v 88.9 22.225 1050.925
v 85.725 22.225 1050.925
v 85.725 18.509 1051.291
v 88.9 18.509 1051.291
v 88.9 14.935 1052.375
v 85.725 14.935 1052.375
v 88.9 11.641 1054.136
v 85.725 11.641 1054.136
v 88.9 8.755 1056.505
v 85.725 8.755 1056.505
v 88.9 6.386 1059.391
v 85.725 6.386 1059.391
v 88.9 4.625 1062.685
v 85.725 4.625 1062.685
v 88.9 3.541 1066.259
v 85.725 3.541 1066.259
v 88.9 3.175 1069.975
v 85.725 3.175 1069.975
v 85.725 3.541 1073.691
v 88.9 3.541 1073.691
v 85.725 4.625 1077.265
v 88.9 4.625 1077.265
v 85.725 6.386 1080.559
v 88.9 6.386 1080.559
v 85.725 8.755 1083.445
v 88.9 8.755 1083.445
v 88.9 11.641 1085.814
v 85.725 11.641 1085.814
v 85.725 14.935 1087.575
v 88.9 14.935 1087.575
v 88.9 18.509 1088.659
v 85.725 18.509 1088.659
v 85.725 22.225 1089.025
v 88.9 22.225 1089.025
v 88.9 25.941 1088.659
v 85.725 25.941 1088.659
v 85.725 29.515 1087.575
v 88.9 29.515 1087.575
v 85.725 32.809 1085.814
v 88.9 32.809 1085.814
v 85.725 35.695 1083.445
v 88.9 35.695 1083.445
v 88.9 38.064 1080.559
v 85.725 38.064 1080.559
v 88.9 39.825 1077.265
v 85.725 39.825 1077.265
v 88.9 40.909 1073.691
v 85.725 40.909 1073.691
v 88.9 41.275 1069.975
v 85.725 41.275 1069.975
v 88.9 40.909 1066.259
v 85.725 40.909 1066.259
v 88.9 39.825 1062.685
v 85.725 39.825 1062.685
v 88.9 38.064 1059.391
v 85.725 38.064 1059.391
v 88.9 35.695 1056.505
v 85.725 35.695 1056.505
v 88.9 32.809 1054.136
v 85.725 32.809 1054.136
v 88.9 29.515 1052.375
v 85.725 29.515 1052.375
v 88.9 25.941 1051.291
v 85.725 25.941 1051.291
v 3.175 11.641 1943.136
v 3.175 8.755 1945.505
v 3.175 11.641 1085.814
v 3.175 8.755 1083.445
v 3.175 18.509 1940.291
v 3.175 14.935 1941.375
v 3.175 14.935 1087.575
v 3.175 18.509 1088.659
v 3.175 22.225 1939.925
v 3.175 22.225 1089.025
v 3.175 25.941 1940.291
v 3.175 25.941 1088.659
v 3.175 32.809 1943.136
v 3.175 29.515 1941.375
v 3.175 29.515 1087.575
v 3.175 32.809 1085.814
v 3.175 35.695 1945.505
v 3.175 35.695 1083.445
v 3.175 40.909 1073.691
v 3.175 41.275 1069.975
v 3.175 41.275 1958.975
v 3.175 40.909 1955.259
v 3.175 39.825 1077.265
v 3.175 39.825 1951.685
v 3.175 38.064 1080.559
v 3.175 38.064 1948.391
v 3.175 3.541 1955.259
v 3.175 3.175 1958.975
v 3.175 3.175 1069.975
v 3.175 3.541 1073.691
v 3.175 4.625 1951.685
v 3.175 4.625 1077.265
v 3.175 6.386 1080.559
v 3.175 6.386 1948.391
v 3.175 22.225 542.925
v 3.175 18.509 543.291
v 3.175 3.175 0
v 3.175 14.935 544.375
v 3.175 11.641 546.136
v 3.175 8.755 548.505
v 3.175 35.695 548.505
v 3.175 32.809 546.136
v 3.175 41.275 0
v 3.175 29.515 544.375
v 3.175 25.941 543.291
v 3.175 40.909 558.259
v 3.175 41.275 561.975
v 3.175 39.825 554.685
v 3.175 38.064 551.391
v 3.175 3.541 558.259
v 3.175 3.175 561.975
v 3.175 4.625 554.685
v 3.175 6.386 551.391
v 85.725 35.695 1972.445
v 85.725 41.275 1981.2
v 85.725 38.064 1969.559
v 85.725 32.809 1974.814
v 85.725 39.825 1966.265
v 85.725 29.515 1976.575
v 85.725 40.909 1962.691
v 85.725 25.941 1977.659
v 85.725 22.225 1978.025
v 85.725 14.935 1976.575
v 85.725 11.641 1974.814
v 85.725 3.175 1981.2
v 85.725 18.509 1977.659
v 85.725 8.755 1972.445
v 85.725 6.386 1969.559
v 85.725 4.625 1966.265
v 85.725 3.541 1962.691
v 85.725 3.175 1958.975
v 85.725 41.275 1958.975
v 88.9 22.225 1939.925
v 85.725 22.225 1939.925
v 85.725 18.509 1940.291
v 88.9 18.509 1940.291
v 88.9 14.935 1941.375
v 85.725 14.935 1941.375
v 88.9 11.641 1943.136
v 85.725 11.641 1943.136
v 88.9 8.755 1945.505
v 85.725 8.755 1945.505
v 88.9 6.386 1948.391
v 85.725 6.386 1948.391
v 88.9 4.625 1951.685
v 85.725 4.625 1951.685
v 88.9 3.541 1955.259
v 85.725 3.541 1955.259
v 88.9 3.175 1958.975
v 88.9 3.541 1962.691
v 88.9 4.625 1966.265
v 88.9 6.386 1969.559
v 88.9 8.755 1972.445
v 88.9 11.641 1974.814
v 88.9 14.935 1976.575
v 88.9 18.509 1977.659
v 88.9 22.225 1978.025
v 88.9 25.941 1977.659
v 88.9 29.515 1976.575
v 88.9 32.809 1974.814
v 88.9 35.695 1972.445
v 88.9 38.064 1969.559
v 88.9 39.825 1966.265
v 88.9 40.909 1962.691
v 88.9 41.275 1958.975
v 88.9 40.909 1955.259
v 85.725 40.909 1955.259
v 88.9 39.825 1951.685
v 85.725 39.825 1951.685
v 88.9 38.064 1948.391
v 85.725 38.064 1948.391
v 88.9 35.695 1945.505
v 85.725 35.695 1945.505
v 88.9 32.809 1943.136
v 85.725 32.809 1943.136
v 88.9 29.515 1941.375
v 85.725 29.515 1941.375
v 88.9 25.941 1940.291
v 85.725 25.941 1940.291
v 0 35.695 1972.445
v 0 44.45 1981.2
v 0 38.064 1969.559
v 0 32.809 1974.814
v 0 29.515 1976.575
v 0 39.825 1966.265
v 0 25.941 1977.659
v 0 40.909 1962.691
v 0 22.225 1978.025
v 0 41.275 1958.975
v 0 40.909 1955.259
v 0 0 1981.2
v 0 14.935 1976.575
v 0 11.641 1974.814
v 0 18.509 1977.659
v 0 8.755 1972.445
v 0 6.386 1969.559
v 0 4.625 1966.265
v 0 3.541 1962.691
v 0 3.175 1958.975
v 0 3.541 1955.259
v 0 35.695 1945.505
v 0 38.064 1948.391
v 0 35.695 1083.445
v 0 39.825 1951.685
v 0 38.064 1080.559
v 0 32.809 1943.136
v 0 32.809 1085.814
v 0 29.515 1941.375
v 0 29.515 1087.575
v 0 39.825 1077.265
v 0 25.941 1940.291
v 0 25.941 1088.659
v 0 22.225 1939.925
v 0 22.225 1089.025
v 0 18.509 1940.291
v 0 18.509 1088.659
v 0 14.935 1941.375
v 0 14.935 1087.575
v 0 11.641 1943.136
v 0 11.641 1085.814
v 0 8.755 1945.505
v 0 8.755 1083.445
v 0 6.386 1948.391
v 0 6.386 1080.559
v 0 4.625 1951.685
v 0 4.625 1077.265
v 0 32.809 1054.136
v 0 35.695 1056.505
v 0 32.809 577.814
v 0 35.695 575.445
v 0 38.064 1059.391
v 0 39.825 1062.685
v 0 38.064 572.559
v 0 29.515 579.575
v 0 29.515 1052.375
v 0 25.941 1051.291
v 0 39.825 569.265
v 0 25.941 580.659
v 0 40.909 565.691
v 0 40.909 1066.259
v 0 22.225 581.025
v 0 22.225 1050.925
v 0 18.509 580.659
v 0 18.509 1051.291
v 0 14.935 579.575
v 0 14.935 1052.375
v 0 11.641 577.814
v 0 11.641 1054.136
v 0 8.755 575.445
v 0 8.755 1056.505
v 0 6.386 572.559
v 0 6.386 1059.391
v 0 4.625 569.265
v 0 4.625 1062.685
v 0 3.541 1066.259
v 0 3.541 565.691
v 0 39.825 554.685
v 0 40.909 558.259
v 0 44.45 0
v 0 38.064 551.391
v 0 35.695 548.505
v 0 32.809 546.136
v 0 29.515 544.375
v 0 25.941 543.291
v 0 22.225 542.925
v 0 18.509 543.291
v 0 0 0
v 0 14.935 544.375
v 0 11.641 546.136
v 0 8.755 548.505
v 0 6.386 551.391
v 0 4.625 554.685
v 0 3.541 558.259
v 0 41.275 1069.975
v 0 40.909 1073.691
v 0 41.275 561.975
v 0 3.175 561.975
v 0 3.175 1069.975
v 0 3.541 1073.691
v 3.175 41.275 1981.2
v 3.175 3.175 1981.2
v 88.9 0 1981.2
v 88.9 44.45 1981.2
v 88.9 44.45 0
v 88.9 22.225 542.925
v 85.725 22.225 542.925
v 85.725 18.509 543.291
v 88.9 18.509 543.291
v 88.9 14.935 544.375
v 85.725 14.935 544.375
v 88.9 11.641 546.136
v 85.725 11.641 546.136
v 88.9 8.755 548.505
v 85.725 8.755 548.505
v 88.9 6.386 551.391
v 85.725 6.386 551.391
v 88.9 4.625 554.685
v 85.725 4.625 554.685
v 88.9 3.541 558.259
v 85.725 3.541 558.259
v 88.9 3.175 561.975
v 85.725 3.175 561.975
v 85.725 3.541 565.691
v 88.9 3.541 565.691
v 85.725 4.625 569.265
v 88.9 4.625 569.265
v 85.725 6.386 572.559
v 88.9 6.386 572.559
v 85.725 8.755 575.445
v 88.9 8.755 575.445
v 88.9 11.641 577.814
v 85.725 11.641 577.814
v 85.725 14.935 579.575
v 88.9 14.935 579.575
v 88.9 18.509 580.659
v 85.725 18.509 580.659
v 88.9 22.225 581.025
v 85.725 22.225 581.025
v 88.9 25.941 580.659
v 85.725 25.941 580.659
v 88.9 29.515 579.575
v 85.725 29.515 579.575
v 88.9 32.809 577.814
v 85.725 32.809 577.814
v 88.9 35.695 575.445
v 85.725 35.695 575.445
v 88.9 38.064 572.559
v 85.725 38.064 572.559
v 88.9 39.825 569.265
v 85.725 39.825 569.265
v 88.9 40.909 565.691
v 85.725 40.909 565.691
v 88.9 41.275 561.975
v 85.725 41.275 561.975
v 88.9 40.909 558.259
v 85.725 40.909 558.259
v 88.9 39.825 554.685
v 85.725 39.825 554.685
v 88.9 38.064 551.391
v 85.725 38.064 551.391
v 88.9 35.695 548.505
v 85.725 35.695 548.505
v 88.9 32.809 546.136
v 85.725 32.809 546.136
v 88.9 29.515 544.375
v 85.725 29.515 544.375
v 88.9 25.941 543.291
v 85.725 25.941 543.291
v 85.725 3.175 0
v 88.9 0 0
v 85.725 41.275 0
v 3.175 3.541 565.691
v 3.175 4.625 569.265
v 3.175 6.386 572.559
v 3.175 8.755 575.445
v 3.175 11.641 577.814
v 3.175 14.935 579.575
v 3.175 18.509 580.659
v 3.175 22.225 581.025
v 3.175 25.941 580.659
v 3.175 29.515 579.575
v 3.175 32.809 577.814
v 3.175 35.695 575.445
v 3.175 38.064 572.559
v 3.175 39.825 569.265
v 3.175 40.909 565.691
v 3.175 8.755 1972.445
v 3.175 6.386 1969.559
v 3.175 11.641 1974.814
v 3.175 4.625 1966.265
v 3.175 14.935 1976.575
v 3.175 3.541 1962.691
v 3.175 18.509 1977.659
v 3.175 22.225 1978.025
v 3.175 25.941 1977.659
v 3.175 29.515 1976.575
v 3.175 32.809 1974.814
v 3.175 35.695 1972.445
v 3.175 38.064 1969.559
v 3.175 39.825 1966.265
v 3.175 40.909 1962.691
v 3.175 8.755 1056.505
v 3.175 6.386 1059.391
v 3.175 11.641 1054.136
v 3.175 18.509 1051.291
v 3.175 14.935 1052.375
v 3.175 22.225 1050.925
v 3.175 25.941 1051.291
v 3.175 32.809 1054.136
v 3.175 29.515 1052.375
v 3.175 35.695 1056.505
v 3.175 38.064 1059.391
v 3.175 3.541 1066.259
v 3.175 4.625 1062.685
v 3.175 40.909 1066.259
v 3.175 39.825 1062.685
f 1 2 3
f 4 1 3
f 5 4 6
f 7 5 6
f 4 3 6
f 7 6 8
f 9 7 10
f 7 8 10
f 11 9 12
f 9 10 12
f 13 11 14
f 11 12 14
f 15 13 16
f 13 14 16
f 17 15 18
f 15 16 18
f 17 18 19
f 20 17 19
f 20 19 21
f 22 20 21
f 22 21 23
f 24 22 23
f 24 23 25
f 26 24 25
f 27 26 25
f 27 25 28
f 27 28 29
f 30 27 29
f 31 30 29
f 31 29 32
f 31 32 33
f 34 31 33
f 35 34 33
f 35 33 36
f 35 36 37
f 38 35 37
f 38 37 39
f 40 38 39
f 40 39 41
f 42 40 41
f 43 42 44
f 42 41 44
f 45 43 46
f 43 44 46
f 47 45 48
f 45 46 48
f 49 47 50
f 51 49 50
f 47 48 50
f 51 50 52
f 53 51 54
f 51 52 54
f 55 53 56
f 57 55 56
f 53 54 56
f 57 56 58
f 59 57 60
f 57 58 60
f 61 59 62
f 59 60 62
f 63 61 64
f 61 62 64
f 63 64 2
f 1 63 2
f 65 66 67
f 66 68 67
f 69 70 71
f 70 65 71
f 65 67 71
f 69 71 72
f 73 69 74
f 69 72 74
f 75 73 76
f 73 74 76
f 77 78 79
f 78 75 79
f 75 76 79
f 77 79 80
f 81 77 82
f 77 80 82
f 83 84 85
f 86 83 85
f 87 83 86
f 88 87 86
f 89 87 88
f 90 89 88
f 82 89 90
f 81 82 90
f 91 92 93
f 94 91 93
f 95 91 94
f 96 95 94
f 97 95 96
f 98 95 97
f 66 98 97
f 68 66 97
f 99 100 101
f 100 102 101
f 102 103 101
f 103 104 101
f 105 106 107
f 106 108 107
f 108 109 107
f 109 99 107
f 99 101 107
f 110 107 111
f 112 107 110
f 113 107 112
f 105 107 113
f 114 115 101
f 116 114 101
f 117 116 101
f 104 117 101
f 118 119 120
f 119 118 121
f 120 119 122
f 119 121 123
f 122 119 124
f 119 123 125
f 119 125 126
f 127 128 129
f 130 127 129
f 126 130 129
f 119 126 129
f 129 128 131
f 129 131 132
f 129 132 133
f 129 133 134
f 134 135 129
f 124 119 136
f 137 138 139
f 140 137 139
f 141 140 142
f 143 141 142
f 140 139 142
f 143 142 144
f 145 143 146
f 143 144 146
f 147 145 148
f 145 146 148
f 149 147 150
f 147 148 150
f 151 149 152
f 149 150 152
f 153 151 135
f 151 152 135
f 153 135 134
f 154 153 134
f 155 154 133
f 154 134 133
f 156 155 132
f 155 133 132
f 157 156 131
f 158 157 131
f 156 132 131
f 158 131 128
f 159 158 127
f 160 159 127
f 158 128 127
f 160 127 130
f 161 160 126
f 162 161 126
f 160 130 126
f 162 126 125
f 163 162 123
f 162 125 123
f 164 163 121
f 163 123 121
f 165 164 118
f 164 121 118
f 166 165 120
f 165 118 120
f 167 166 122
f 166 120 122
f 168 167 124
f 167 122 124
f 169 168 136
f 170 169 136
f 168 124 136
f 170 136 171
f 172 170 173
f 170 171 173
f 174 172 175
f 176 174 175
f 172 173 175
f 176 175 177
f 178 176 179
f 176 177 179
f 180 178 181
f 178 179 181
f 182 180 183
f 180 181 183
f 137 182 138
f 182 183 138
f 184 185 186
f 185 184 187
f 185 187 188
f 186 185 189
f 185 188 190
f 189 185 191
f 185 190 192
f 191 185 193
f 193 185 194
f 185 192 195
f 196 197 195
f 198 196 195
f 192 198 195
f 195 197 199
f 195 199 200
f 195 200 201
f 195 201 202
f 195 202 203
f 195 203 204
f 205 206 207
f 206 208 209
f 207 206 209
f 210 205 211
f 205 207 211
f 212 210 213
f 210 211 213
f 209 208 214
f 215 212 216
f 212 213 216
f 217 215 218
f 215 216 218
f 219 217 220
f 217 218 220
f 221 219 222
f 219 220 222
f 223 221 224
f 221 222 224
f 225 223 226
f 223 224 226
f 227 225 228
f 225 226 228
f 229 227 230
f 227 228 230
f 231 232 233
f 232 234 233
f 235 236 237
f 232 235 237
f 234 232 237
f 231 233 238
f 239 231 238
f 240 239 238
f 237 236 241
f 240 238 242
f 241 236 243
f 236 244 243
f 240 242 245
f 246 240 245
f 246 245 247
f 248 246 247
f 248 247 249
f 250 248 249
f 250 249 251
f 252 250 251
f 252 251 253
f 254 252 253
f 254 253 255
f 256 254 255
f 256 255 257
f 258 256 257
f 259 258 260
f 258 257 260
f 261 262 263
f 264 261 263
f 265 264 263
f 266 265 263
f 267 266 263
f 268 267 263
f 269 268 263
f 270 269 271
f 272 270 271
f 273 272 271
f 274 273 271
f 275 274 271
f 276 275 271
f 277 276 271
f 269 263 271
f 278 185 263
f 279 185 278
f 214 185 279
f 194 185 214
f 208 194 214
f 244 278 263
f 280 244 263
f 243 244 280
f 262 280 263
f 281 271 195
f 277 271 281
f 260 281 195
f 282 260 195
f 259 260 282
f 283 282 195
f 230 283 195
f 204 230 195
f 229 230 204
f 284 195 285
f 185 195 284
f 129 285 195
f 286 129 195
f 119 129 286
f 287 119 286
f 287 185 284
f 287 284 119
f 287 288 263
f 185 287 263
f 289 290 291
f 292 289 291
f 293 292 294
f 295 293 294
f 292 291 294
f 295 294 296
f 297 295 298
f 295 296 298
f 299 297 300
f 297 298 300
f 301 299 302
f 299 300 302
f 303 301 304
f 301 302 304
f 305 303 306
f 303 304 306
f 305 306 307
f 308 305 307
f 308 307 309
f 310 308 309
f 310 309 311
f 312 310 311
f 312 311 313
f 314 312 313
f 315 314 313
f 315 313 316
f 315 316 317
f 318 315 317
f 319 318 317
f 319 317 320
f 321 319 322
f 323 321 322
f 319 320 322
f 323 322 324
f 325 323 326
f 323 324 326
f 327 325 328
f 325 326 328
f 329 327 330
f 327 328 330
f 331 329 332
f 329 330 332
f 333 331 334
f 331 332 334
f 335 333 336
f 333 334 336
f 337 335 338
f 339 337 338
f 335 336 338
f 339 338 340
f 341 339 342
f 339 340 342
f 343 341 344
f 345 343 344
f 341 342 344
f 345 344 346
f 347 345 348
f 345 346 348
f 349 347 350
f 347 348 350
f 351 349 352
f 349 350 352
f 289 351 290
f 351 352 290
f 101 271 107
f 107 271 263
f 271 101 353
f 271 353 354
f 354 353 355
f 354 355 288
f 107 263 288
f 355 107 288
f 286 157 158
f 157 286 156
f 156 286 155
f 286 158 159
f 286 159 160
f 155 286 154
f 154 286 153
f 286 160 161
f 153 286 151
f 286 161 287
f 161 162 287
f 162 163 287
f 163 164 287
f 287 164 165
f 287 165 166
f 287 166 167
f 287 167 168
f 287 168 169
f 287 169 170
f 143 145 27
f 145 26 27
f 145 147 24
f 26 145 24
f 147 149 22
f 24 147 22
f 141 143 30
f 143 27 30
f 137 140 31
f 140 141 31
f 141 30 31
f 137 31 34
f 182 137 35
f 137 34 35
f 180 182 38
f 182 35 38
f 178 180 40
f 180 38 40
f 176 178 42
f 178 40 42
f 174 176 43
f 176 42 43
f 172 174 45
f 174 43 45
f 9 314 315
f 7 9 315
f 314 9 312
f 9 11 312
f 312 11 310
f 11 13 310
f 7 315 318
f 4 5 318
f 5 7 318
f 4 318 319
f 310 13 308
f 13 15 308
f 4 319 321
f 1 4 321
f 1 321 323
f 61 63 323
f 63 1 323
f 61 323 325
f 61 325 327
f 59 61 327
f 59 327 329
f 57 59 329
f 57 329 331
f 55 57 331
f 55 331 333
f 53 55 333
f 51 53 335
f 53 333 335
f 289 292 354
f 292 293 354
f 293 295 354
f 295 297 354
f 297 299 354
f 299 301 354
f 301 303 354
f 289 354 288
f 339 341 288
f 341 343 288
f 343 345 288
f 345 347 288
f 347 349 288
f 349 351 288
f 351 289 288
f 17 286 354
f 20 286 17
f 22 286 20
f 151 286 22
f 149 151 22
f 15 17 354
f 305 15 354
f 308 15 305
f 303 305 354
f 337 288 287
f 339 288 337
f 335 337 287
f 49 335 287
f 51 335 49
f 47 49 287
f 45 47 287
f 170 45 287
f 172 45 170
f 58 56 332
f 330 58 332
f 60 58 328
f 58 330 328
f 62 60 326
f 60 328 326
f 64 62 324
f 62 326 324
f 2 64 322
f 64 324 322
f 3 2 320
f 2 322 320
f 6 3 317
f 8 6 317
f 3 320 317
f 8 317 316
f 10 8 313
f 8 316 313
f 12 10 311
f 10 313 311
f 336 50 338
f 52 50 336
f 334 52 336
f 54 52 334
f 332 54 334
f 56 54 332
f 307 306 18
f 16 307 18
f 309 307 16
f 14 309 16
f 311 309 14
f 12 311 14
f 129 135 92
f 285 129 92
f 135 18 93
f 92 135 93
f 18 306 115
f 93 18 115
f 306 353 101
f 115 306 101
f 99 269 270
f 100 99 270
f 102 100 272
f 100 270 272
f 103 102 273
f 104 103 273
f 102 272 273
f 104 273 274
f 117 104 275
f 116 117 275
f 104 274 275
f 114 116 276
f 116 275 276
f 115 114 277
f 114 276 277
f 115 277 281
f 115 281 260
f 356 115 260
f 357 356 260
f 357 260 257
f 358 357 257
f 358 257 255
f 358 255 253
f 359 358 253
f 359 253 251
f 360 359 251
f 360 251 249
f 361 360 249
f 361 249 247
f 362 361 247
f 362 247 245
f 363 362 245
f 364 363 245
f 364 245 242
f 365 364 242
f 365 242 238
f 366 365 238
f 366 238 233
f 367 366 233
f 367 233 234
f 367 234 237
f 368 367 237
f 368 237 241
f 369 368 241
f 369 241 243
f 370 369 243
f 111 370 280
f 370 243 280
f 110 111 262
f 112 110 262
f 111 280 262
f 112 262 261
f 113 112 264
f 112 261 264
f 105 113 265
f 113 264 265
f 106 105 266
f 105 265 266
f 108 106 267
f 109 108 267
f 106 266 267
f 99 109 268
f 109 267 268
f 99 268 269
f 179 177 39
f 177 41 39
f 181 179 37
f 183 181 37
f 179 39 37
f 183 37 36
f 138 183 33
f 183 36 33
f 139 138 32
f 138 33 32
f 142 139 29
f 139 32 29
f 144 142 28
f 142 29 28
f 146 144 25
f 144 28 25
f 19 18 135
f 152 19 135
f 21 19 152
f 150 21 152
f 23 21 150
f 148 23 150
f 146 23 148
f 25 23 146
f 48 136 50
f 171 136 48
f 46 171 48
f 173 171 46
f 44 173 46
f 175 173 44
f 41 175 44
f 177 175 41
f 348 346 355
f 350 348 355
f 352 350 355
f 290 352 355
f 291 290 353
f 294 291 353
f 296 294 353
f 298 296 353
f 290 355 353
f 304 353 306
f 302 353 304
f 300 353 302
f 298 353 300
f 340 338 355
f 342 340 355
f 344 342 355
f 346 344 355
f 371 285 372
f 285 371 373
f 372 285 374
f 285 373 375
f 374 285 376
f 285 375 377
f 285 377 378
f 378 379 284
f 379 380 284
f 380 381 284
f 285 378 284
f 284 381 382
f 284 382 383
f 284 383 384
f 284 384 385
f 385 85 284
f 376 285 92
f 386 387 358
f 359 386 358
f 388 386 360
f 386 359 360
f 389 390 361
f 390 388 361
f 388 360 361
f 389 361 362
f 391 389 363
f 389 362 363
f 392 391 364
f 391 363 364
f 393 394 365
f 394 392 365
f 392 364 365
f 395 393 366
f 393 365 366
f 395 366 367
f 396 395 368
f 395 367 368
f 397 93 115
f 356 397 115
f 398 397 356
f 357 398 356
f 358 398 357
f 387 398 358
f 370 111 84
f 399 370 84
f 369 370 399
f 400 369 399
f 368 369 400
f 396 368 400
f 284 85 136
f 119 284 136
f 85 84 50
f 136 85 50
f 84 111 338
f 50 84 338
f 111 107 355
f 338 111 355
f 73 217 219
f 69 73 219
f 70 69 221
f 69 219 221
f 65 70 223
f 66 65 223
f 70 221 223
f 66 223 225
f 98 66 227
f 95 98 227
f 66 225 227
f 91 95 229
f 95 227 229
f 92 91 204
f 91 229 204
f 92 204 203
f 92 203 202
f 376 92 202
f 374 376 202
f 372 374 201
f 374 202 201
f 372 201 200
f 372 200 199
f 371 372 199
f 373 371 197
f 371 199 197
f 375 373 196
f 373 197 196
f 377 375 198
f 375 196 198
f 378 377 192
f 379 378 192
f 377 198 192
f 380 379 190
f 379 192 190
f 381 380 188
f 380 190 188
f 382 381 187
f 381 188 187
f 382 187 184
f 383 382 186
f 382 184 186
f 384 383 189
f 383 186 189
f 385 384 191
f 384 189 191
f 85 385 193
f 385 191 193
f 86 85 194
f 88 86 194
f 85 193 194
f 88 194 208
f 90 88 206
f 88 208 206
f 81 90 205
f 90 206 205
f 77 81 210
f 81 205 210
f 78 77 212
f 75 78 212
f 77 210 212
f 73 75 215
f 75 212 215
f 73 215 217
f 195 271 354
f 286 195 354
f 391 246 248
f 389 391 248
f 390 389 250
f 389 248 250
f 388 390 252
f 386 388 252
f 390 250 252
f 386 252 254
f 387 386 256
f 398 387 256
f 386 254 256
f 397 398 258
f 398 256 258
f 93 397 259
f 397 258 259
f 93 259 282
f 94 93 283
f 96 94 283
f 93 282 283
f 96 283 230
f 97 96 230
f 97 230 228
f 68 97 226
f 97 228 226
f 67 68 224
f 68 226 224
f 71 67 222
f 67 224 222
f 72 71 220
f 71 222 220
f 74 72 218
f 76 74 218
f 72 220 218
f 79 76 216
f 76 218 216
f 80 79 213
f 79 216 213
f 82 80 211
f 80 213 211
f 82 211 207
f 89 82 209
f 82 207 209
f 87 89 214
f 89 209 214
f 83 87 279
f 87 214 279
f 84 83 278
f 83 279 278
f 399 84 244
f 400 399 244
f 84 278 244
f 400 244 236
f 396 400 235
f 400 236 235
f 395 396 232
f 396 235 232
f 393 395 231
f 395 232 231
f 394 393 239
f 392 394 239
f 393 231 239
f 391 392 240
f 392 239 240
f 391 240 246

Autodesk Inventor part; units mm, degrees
ref_plane "YZ Plane" through (0, 0, 0) normal (1, 0, 0) x (0, 1, 0)
ref_plane "XZ Plane" through (0, 0, 0) normal (0, 1, 0) x (-1, 0, 0)
ref_plane "XY Plane" through (0, 0, 0) normal (0, 0, 1) x (1, 0, 0)
sketch "Sketch1" plane through (0, 0, 0) normal (0, 0, 1) x (1, 0, 0)
  line L0 (0, 0) -> (88.9, 0)
  line L1 (88.9, 0) -> (88.9, 44.45)
  line L2 (88.9, 44.45) -> (0, 44.45)
  line L3 (0, 44.45) -> (0, 0)
  line L4 (3.175, 41.275) -> (85.725, 41.275)
  line L5 (85.725, 41.275) -> (85.725, 3.175)
  line L6 (85.725, 3.175) -> (3.175, 3.175)
  line L7 (3.175, 3.175) -> (3.175, 41.275)
  dimension "d0" = 3.175
  dimension "d1" = 88.9
  dimension "d2" = 44.45
extrude "Extrusion1" add sketch "Sketch1" along normal blind 1981.2
hole "Hole1" at (88.9, 22.225, 1958.975) direction (-1, 0, 0) diameter 38.1 end through all
pattern_linear "Rectangular Pattern1" count 2 spacing 889 along (0, 0, -1) of "Hole1"
hole "Hole2" at (88.9, 22.225, 561.975) direction (-1, 0, 0) diameter 38.1 end through all
properties part number "GE-12026-01"
